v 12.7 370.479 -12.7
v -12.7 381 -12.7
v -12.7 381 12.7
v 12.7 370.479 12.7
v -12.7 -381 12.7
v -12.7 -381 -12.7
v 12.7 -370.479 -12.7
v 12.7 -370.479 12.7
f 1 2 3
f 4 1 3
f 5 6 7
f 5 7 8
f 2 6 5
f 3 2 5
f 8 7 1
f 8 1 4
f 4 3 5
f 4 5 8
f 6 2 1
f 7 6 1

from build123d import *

# Parameters (mm, degrees)
F0_W       = 25.4
F0_H       = 25.4
F1_DEPTH   = 381
F2_SIZE2   = 10.521014
F2_SIZE    = 25.39999
F2_2_SIZE2 = 10.521014
F2_2_SIZE  = 25.39999


# Not quite as in the source:
# - a fillet or chamfer is up to 0.001 mm smaller than in the source, because OpenCascade refuses the exact size


with BuildPart() as f1:
    # F0 (on Front) → F1 (new body, symmetric)
    with BuildSketch(Plane.XZ):
        Rectangle(F0_W, F0_H)
    extrude(amount=F1_DEPTH, both=True)

    # F2 (size 25.4 and 10.5210244843 in the source; OpenCascade refuses exactly that, so slightly less here)
    f2_edges = [f1.edges().sort_by_distance(p)[0] for p in [
        (12.7, -381, 0),
    ]]
    f2_side = f1.faces().sort_by_distance((0, -381, 0))[0]
    chamfer(f2_edges, length=F2_SIZE, length2=F2_SIZE2, reference=f2_side)

    # F2#2 (size 25.4 and 10.5210244843 in the source; OpenCascade refuses exactly that, so slightly less here)
    f2_2_edges = [f1.edges().sort_by_distance(p)[0] for p in [
        (12.7, 381, 0),
    ]]
    f2_2_side = f1.faces().sort_by_distance((0, 381, 0))[0]
    chamfer(f2_2_edges, length=F2_2_SIZE, length2=F2_2_SIZE2, reference=f2_2_side)


solid = f1.part
